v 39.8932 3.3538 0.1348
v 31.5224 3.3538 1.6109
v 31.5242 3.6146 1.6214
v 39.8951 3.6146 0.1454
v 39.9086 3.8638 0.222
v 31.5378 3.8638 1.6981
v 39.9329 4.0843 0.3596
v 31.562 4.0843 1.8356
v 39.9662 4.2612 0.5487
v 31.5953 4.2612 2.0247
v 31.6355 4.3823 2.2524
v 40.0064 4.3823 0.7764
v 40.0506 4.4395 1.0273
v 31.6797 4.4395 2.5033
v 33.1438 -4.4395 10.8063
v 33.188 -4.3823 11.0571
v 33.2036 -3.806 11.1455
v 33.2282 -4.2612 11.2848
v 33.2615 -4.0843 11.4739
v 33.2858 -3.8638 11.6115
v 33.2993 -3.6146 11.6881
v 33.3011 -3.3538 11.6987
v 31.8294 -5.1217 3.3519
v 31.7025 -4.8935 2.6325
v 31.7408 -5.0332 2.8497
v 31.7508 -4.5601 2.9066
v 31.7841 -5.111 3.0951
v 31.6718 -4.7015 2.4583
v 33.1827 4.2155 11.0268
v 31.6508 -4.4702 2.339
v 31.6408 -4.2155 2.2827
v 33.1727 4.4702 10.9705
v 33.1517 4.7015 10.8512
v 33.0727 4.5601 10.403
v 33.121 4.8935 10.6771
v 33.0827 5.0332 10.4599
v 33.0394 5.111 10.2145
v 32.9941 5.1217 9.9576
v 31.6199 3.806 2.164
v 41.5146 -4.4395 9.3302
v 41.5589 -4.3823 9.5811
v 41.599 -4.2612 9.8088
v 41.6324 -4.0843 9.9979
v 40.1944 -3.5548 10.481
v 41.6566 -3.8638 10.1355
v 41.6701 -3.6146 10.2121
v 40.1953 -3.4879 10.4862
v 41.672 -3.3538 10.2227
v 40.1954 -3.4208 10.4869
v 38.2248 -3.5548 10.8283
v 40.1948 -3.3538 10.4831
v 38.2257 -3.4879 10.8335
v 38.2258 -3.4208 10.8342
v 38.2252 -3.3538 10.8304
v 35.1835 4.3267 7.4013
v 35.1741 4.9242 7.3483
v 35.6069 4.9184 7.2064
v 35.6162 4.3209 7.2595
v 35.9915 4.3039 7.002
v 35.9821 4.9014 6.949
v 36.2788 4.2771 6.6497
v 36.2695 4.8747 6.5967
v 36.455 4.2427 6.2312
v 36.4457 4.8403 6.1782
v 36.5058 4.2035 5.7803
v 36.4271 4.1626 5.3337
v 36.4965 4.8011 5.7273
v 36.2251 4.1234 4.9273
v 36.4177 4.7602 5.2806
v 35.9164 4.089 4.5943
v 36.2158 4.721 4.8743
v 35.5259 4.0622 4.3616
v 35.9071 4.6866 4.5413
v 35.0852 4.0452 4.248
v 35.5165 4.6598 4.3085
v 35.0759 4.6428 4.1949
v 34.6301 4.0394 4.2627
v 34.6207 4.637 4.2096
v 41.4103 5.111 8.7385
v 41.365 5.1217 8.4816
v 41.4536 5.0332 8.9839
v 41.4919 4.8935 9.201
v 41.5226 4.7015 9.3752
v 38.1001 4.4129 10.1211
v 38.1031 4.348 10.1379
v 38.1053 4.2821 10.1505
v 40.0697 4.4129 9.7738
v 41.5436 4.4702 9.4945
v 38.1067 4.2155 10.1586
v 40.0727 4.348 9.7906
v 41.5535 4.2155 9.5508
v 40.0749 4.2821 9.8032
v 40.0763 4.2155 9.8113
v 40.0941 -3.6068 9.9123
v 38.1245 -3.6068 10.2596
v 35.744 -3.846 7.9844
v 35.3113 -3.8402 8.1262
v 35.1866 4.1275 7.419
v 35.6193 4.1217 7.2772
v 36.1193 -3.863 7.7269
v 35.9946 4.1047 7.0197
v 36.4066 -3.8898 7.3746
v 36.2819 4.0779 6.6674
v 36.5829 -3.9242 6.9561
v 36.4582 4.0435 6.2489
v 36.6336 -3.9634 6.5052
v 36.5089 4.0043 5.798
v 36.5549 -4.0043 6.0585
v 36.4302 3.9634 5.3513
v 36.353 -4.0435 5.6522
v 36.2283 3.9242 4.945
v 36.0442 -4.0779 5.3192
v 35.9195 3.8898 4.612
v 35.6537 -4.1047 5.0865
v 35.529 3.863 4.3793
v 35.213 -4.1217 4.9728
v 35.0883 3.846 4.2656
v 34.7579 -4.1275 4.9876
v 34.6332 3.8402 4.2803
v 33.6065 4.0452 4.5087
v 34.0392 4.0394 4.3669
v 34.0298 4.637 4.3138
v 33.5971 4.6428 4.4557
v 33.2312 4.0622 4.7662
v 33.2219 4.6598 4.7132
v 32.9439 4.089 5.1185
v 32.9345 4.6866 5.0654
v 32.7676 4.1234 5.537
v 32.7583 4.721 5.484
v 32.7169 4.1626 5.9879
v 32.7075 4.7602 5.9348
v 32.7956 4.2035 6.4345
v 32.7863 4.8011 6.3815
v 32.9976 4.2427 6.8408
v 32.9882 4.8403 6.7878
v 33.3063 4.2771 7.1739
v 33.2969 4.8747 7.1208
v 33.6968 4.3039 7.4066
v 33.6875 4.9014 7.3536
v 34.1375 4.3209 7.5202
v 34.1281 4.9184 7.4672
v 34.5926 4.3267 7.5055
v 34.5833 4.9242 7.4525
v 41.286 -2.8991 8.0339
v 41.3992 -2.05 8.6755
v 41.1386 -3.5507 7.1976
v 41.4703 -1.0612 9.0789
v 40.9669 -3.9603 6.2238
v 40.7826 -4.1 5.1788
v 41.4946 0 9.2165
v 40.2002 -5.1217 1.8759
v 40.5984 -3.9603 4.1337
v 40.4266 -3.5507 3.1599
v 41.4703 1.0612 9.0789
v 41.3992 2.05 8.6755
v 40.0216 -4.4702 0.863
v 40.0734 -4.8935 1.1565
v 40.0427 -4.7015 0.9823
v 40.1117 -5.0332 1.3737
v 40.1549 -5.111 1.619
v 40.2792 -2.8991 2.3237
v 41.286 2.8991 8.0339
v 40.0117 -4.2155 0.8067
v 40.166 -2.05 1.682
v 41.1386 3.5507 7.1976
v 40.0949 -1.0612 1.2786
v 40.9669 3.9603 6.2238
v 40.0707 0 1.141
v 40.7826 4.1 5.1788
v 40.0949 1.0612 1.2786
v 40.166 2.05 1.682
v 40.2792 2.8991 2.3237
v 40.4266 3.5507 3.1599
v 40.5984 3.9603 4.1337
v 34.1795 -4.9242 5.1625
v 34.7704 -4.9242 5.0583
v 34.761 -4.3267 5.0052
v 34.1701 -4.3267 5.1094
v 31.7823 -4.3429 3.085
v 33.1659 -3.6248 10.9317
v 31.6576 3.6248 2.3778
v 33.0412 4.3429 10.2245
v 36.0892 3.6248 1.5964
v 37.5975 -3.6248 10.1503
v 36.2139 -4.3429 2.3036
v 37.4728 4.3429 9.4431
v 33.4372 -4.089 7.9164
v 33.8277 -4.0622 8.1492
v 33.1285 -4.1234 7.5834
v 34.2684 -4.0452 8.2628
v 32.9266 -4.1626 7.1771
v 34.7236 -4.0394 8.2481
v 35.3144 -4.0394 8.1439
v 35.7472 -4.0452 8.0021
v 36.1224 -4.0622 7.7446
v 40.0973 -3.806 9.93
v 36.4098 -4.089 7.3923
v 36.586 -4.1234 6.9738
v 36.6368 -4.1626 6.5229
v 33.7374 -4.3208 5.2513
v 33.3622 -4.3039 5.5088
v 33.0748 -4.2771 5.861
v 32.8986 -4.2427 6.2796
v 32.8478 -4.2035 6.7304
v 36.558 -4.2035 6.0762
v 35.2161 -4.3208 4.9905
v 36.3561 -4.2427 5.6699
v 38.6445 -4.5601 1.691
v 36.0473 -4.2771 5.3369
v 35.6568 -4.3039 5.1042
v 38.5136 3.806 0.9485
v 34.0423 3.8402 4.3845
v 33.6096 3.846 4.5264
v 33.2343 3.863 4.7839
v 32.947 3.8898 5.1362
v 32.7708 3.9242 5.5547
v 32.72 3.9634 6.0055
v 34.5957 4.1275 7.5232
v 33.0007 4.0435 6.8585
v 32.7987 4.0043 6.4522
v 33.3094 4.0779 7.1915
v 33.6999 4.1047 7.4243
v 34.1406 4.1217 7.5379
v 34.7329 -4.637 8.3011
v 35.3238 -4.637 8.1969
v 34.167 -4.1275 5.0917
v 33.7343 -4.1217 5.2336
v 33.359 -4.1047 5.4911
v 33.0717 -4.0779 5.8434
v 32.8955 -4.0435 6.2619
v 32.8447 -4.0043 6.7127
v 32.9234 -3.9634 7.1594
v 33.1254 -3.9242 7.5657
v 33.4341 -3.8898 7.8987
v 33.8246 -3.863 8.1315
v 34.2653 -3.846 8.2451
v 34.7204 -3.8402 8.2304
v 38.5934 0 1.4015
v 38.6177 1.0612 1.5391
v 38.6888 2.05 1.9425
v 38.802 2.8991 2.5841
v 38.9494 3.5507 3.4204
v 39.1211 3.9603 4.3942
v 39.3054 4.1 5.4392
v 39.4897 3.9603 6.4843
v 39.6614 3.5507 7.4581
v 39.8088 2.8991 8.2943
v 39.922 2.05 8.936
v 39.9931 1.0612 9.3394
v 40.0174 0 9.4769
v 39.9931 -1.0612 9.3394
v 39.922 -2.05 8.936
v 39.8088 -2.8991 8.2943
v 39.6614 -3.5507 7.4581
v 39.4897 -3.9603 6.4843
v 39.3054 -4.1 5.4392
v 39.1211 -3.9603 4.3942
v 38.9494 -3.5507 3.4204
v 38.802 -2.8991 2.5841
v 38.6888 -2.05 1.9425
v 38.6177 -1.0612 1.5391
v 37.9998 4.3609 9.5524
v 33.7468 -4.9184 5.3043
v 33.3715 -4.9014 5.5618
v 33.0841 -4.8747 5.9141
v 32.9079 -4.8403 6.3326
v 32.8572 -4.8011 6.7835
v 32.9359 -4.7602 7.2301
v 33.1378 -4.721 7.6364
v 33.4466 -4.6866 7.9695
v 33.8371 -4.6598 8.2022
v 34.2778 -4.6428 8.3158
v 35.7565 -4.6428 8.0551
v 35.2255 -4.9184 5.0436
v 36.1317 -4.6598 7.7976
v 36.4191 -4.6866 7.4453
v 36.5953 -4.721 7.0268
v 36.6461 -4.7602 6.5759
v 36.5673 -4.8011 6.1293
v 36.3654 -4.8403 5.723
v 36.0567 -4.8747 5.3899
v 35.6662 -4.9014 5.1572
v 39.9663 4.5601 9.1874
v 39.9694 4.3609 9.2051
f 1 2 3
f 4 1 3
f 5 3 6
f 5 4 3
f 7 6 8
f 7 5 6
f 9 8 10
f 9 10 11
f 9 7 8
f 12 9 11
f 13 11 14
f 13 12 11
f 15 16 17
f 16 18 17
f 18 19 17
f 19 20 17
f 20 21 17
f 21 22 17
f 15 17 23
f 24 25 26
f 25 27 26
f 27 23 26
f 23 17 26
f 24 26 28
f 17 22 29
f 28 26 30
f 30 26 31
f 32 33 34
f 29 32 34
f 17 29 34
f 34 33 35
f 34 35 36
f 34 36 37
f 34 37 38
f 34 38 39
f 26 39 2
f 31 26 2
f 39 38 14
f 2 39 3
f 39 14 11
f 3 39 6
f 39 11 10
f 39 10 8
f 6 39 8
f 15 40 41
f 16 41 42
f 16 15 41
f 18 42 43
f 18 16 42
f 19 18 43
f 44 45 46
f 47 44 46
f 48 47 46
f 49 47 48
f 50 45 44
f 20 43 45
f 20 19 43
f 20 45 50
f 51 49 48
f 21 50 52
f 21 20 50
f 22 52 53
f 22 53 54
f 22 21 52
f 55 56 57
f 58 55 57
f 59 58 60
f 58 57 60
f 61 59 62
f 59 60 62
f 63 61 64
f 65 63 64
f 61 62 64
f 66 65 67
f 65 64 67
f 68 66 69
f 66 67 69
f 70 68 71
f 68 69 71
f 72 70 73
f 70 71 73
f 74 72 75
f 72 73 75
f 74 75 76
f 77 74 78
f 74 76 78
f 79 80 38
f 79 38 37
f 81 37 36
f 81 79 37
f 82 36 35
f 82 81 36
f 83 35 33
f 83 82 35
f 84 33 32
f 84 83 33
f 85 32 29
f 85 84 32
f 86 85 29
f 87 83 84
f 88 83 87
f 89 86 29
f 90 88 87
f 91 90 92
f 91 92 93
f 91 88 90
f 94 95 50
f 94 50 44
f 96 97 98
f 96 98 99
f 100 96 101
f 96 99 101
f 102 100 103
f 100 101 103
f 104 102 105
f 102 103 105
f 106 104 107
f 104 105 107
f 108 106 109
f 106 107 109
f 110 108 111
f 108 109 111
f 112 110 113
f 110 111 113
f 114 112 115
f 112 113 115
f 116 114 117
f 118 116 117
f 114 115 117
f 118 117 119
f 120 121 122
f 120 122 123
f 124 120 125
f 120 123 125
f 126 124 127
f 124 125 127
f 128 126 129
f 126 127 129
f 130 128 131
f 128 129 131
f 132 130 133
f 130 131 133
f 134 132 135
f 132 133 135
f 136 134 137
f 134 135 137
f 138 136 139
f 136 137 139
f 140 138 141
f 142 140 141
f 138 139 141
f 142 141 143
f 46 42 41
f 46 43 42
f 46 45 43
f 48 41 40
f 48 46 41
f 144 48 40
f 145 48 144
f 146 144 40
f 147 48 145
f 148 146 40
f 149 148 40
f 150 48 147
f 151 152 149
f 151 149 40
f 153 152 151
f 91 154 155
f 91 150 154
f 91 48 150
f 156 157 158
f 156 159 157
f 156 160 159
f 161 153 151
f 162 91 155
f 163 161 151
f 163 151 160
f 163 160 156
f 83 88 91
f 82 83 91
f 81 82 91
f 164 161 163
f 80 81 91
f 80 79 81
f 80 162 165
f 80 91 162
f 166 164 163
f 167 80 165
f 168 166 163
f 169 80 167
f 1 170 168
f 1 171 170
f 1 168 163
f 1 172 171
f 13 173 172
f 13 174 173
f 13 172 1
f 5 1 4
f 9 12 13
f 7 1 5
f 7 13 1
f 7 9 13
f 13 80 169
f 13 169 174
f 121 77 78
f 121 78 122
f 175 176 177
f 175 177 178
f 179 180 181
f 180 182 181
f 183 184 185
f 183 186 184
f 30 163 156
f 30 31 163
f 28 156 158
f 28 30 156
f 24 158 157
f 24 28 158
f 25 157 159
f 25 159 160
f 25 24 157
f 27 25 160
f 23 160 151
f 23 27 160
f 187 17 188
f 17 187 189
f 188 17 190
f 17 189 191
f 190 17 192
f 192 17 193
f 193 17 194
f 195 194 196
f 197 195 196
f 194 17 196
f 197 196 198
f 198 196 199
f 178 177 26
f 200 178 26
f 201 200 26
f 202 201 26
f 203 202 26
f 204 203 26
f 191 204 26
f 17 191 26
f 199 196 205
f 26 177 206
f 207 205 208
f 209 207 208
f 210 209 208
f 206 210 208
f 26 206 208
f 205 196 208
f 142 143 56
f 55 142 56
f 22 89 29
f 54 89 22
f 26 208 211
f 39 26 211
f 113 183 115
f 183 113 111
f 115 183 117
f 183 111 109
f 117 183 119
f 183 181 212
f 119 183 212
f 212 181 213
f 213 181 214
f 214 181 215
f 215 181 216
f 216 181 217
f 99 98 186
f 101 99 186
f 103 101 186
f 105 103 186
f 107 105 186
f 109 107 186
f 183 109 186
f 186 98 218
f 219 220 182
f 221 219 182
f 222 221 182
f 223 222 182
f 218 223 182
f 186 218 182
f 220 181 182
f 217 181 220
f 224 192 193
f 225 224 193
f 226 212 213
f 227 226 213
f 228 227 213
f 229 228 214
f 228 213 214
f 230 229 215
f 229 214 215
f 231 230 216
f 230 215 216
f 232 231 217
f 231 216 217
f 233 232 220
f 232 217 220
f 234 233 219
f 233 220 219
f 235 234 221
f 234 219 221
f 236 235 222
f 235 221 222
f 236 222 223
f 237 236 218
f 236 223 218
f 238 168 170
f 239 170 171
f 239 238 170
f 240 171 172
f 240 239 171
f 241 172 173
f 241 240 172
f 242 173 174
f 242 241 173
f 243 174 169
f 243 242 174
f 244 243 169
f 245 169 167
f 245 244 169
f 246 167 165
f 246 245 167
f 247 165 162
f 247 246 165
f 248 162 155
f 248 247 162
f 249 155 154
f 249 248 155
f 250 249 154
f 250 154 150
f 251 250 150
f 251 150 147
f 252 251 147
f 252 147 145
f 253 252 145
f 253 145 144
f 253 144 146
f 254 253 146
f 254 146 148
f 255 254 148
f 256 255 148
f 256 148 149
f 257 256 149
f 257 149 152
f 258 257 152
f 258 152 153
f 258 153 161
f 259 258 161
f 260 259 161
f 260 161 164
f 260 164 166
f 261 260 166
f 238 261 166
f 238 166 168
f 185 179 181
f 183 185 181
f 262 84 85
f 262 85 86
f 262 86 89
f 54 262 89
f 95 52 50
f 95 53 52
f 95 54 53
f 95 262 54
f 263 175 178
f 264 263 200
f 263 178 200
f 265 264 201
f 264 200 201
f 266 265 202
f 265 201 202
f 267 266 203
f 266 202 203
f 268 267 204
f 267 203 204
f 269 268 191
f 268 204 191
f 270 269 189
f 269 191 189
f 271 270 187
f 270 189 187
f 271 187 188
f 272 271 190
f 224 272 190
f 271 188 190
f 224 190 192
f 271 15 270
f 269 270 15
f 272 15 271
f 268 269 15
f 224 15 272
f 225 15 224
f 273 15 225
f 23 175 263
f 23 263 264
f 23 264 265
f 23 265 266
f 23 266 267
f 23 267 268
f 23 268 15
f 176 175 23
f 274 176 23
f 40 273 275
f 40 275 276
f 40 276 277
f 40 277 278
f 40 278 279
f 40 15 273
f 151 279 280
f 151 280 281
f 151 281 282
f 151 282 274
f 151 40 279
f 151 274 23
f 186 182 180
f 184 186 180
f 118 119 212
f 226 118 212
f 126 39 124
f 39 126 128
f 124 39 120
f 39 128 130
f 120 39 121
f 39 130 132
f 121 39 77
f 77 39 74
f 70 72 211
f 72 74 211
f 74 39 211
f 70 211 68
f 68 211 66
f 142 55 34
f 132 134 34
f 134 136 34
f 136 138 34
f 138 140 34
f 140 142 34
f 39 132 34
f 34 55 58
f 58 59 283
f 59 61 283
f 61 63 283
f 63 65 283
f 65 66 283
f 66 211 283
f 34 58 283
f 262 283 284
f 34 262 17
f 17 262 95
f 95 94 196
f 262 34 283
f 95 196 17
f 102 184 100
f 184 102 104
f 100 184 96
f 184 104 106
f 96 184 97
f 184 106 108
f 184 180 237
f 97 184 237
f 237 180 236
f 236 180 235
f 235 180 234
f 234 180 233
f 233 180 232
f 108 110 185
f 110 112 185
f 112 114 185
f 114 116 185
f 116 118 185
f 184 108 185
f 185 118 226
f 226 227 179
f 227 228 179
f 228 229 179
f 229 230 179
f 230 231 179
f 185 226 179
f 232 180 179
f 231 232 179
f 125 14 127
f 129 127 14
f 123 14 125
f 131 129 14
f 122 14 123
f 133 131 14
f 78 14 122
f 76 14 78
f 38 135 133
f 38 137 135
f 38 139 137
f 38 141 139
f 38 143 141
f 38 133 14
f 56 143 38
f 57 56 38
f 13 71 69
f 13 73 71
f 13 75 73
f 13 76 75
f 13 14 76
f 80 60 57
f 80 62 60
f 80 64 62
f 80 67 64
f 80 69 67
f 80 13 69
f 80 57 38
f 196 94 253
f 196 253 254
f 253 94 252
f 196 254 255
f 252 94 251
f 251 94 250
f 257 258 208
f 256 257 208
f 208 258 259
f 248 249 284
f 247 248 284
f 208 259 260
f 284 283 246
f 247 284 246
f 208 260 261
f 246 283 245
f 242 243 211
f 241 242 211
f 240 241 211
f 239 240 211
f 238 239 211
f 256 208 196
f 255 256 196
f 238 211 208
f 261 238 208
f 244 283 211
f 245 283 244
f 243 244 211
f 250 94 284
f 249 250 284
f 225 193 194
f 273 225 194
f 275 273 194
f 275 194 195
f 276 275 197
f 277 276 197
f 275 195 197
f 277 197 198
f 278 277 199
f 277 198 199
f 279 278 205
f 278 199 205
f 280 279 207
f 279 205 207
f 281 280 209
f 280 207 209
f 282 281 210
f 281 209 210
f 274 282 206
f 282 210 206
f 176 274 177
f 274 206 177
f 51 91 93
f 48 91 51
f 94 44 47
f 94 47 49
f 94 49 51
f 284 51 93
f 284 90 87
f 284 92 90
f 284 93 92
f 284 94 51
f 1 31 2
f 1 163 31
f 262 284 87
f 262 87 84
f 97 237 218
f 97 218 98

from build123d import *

# Parameters (mm, degrees)
SKETCH1_R           = 4.1
BOSS_EXTRUDE1_DEPTH = 1.5
BOSS_EXTRUDE2_DEPTH = 7
BOSS_EXTRUDE3_START = -7
BOSS_EXTRUDE3_DEPTH = 4.5
CUT_EXTRUDE1_DEPTH  = 45.370101856
FILLET1_R           = 1
CUT_EXTRUDE2_DEPTH  = 43.442087042


with BuildPart() as part:
    # Sketch1 → Boss-Extrude1 (new body)
    with BuildSketch(Plane(origin=(37.190040953, 0, -6.557607634), x_dir=(-0.1736481776669169, 0, -0.9848077530122105), z_dir=(0.9848077530122106, 0, -0.17364817766691693))):
        Polygon((-16.531662389, 5.211492046), (-17.393401075, -4.34975298), (-7.83215605, -5.211491666), (-6.970417363, 4.349753359), align=None)
        with Locations((-12.181909219, 0)):
            Circle(SKETCH1_R, mode=Mode.SUBTRACT)
    extrude(amount=BOSS_EXTRUDE1_DEPTH)

    # Sketch1<3> → Boss-Extrude2 (add)
    with BuildSketch(Plane(origin=(37.190040953, 0, -6.557607634), x_dir=(-0.1736481776669169, 0, -0.9848077530122105), z_dir=(0.9848077530122106, 0, -0.17364817766691693))):
        Polygon((-7.83215605, -5.211491666), (-6.970417363, 4.349753359), (-16.531662389, 5.211492046), (-17.393401075, -4.34975298), align=None)
        Polygon((-8.375875196, -4.560055184), (-7.621853845, 3.806034213), (-15.987943243, 4.560055564), (-16.741964593, -3.806033833), align=None, mode=Mode.SUBTRACT)
    extrude(amount=-BOSS_EXTRUDE2_DEPTH)


with BuildPart() as body_2:
    # Sketch1<4> → Boss-Extrude3 (new body)
    with BuildSketch(Plane(origin=(37.190040953, 0, -6.557607634), x_dir=(-0.1736481776669169, 0, -0.9848077530122105), z_dir=(0.9848077530122106, 0, -0.17364817766691693)).offset(BOSS_EXTRUDE3_START)):
        Polygon((-16.524819099, -3.624794118), (-8.557114911, -4.34290969), (-7.838999339, 3.624794498), (-15.806703527, 4.34291007), align=None)
    extrude(amount=BOSS_EXTRUDE3_DEPTH)


with BuildPart() as cut_extrude1_tool:
    # Sketch2 → Cut-Extrude1 (new, through all)
    with BuildSketch(Plane(origin=(-0.057774785, 3.691534806, -0.327657089), x_dir=(0.9998782702631323, 0.01558743255466835, -0.0006903636436052229), z_dir=(-0.015587432554668353, 0.9959630234822288, -0.08840072286181537))):
        with BuildLine():
            Line((34.650665927, -7.834733366), (35.241550579, -7.730544459))
            ThreePointArc((35.241550579, -7.730544459), (36.5394059, -5.87701497), (34.685876411, -4.57915965))
            Line((34.685876411, -4.57915965), (34.094991759, -4.683348556))
            ThreePointArc((34.094991759, -4.683348556), (32.797136438, -6.536878046), (34.650665927, -7.834733366))
        make_face()
    extrude(amount=-CUT_EXTRUDE1_DEPTH)


with BuildPart() as part_1:
    add(part.part)

    # Cut-Extrude1: cut by cut_extrude1_tool
    add(cut_extrude1_tool.part, mode=Mode.SUBTRACT)

    # Fillet1
    fillet1_edges = [part_1.edges().sort_by_distance(p)[0] for p in [
        (35.692219905, 4.349753359, 0.784445916),
        (35.841859257, -5.211491666, 1.633092856),
        (37.502152032, -4.34975298, 11.049081085),
        (37.35251268, 5.211492046, 10.200434146),
    ]]
    fillet(fillet1_edges, radius=FILLET1_R)

    # Sketch3 → Cut-Extrude2 (cut, through all)
    with BuildSketch(Plane(origin=(2.790110099, 1.448145681, 15.823500677), x_dir=(0.9849311034009463, -0.015762022746430758, -0.17222740836561337), z_dir=(0.1729471640513216, 0.08976444650382359, 0.980832107238781))):
        Polygon((35.713280339, 3.472127719), (35.839887632, -4.52687038), (37.839637157, -4.495218557), (37.713029864, 3.503779542), align=None)
    extrude(amount=CUT_EXTRUDE2_DEPTH, mode=Mode.SUBTRACT)


with BuildPart() as body_2_1:
    add(body_2.part)

    # Cut-Extrude1: cut by cut_extrude1_tool
    add(cut_extrude1_tool.part, mode=Mode.SUBTRACT)


solid = Compound([part_1.part, body_2_1.part])
